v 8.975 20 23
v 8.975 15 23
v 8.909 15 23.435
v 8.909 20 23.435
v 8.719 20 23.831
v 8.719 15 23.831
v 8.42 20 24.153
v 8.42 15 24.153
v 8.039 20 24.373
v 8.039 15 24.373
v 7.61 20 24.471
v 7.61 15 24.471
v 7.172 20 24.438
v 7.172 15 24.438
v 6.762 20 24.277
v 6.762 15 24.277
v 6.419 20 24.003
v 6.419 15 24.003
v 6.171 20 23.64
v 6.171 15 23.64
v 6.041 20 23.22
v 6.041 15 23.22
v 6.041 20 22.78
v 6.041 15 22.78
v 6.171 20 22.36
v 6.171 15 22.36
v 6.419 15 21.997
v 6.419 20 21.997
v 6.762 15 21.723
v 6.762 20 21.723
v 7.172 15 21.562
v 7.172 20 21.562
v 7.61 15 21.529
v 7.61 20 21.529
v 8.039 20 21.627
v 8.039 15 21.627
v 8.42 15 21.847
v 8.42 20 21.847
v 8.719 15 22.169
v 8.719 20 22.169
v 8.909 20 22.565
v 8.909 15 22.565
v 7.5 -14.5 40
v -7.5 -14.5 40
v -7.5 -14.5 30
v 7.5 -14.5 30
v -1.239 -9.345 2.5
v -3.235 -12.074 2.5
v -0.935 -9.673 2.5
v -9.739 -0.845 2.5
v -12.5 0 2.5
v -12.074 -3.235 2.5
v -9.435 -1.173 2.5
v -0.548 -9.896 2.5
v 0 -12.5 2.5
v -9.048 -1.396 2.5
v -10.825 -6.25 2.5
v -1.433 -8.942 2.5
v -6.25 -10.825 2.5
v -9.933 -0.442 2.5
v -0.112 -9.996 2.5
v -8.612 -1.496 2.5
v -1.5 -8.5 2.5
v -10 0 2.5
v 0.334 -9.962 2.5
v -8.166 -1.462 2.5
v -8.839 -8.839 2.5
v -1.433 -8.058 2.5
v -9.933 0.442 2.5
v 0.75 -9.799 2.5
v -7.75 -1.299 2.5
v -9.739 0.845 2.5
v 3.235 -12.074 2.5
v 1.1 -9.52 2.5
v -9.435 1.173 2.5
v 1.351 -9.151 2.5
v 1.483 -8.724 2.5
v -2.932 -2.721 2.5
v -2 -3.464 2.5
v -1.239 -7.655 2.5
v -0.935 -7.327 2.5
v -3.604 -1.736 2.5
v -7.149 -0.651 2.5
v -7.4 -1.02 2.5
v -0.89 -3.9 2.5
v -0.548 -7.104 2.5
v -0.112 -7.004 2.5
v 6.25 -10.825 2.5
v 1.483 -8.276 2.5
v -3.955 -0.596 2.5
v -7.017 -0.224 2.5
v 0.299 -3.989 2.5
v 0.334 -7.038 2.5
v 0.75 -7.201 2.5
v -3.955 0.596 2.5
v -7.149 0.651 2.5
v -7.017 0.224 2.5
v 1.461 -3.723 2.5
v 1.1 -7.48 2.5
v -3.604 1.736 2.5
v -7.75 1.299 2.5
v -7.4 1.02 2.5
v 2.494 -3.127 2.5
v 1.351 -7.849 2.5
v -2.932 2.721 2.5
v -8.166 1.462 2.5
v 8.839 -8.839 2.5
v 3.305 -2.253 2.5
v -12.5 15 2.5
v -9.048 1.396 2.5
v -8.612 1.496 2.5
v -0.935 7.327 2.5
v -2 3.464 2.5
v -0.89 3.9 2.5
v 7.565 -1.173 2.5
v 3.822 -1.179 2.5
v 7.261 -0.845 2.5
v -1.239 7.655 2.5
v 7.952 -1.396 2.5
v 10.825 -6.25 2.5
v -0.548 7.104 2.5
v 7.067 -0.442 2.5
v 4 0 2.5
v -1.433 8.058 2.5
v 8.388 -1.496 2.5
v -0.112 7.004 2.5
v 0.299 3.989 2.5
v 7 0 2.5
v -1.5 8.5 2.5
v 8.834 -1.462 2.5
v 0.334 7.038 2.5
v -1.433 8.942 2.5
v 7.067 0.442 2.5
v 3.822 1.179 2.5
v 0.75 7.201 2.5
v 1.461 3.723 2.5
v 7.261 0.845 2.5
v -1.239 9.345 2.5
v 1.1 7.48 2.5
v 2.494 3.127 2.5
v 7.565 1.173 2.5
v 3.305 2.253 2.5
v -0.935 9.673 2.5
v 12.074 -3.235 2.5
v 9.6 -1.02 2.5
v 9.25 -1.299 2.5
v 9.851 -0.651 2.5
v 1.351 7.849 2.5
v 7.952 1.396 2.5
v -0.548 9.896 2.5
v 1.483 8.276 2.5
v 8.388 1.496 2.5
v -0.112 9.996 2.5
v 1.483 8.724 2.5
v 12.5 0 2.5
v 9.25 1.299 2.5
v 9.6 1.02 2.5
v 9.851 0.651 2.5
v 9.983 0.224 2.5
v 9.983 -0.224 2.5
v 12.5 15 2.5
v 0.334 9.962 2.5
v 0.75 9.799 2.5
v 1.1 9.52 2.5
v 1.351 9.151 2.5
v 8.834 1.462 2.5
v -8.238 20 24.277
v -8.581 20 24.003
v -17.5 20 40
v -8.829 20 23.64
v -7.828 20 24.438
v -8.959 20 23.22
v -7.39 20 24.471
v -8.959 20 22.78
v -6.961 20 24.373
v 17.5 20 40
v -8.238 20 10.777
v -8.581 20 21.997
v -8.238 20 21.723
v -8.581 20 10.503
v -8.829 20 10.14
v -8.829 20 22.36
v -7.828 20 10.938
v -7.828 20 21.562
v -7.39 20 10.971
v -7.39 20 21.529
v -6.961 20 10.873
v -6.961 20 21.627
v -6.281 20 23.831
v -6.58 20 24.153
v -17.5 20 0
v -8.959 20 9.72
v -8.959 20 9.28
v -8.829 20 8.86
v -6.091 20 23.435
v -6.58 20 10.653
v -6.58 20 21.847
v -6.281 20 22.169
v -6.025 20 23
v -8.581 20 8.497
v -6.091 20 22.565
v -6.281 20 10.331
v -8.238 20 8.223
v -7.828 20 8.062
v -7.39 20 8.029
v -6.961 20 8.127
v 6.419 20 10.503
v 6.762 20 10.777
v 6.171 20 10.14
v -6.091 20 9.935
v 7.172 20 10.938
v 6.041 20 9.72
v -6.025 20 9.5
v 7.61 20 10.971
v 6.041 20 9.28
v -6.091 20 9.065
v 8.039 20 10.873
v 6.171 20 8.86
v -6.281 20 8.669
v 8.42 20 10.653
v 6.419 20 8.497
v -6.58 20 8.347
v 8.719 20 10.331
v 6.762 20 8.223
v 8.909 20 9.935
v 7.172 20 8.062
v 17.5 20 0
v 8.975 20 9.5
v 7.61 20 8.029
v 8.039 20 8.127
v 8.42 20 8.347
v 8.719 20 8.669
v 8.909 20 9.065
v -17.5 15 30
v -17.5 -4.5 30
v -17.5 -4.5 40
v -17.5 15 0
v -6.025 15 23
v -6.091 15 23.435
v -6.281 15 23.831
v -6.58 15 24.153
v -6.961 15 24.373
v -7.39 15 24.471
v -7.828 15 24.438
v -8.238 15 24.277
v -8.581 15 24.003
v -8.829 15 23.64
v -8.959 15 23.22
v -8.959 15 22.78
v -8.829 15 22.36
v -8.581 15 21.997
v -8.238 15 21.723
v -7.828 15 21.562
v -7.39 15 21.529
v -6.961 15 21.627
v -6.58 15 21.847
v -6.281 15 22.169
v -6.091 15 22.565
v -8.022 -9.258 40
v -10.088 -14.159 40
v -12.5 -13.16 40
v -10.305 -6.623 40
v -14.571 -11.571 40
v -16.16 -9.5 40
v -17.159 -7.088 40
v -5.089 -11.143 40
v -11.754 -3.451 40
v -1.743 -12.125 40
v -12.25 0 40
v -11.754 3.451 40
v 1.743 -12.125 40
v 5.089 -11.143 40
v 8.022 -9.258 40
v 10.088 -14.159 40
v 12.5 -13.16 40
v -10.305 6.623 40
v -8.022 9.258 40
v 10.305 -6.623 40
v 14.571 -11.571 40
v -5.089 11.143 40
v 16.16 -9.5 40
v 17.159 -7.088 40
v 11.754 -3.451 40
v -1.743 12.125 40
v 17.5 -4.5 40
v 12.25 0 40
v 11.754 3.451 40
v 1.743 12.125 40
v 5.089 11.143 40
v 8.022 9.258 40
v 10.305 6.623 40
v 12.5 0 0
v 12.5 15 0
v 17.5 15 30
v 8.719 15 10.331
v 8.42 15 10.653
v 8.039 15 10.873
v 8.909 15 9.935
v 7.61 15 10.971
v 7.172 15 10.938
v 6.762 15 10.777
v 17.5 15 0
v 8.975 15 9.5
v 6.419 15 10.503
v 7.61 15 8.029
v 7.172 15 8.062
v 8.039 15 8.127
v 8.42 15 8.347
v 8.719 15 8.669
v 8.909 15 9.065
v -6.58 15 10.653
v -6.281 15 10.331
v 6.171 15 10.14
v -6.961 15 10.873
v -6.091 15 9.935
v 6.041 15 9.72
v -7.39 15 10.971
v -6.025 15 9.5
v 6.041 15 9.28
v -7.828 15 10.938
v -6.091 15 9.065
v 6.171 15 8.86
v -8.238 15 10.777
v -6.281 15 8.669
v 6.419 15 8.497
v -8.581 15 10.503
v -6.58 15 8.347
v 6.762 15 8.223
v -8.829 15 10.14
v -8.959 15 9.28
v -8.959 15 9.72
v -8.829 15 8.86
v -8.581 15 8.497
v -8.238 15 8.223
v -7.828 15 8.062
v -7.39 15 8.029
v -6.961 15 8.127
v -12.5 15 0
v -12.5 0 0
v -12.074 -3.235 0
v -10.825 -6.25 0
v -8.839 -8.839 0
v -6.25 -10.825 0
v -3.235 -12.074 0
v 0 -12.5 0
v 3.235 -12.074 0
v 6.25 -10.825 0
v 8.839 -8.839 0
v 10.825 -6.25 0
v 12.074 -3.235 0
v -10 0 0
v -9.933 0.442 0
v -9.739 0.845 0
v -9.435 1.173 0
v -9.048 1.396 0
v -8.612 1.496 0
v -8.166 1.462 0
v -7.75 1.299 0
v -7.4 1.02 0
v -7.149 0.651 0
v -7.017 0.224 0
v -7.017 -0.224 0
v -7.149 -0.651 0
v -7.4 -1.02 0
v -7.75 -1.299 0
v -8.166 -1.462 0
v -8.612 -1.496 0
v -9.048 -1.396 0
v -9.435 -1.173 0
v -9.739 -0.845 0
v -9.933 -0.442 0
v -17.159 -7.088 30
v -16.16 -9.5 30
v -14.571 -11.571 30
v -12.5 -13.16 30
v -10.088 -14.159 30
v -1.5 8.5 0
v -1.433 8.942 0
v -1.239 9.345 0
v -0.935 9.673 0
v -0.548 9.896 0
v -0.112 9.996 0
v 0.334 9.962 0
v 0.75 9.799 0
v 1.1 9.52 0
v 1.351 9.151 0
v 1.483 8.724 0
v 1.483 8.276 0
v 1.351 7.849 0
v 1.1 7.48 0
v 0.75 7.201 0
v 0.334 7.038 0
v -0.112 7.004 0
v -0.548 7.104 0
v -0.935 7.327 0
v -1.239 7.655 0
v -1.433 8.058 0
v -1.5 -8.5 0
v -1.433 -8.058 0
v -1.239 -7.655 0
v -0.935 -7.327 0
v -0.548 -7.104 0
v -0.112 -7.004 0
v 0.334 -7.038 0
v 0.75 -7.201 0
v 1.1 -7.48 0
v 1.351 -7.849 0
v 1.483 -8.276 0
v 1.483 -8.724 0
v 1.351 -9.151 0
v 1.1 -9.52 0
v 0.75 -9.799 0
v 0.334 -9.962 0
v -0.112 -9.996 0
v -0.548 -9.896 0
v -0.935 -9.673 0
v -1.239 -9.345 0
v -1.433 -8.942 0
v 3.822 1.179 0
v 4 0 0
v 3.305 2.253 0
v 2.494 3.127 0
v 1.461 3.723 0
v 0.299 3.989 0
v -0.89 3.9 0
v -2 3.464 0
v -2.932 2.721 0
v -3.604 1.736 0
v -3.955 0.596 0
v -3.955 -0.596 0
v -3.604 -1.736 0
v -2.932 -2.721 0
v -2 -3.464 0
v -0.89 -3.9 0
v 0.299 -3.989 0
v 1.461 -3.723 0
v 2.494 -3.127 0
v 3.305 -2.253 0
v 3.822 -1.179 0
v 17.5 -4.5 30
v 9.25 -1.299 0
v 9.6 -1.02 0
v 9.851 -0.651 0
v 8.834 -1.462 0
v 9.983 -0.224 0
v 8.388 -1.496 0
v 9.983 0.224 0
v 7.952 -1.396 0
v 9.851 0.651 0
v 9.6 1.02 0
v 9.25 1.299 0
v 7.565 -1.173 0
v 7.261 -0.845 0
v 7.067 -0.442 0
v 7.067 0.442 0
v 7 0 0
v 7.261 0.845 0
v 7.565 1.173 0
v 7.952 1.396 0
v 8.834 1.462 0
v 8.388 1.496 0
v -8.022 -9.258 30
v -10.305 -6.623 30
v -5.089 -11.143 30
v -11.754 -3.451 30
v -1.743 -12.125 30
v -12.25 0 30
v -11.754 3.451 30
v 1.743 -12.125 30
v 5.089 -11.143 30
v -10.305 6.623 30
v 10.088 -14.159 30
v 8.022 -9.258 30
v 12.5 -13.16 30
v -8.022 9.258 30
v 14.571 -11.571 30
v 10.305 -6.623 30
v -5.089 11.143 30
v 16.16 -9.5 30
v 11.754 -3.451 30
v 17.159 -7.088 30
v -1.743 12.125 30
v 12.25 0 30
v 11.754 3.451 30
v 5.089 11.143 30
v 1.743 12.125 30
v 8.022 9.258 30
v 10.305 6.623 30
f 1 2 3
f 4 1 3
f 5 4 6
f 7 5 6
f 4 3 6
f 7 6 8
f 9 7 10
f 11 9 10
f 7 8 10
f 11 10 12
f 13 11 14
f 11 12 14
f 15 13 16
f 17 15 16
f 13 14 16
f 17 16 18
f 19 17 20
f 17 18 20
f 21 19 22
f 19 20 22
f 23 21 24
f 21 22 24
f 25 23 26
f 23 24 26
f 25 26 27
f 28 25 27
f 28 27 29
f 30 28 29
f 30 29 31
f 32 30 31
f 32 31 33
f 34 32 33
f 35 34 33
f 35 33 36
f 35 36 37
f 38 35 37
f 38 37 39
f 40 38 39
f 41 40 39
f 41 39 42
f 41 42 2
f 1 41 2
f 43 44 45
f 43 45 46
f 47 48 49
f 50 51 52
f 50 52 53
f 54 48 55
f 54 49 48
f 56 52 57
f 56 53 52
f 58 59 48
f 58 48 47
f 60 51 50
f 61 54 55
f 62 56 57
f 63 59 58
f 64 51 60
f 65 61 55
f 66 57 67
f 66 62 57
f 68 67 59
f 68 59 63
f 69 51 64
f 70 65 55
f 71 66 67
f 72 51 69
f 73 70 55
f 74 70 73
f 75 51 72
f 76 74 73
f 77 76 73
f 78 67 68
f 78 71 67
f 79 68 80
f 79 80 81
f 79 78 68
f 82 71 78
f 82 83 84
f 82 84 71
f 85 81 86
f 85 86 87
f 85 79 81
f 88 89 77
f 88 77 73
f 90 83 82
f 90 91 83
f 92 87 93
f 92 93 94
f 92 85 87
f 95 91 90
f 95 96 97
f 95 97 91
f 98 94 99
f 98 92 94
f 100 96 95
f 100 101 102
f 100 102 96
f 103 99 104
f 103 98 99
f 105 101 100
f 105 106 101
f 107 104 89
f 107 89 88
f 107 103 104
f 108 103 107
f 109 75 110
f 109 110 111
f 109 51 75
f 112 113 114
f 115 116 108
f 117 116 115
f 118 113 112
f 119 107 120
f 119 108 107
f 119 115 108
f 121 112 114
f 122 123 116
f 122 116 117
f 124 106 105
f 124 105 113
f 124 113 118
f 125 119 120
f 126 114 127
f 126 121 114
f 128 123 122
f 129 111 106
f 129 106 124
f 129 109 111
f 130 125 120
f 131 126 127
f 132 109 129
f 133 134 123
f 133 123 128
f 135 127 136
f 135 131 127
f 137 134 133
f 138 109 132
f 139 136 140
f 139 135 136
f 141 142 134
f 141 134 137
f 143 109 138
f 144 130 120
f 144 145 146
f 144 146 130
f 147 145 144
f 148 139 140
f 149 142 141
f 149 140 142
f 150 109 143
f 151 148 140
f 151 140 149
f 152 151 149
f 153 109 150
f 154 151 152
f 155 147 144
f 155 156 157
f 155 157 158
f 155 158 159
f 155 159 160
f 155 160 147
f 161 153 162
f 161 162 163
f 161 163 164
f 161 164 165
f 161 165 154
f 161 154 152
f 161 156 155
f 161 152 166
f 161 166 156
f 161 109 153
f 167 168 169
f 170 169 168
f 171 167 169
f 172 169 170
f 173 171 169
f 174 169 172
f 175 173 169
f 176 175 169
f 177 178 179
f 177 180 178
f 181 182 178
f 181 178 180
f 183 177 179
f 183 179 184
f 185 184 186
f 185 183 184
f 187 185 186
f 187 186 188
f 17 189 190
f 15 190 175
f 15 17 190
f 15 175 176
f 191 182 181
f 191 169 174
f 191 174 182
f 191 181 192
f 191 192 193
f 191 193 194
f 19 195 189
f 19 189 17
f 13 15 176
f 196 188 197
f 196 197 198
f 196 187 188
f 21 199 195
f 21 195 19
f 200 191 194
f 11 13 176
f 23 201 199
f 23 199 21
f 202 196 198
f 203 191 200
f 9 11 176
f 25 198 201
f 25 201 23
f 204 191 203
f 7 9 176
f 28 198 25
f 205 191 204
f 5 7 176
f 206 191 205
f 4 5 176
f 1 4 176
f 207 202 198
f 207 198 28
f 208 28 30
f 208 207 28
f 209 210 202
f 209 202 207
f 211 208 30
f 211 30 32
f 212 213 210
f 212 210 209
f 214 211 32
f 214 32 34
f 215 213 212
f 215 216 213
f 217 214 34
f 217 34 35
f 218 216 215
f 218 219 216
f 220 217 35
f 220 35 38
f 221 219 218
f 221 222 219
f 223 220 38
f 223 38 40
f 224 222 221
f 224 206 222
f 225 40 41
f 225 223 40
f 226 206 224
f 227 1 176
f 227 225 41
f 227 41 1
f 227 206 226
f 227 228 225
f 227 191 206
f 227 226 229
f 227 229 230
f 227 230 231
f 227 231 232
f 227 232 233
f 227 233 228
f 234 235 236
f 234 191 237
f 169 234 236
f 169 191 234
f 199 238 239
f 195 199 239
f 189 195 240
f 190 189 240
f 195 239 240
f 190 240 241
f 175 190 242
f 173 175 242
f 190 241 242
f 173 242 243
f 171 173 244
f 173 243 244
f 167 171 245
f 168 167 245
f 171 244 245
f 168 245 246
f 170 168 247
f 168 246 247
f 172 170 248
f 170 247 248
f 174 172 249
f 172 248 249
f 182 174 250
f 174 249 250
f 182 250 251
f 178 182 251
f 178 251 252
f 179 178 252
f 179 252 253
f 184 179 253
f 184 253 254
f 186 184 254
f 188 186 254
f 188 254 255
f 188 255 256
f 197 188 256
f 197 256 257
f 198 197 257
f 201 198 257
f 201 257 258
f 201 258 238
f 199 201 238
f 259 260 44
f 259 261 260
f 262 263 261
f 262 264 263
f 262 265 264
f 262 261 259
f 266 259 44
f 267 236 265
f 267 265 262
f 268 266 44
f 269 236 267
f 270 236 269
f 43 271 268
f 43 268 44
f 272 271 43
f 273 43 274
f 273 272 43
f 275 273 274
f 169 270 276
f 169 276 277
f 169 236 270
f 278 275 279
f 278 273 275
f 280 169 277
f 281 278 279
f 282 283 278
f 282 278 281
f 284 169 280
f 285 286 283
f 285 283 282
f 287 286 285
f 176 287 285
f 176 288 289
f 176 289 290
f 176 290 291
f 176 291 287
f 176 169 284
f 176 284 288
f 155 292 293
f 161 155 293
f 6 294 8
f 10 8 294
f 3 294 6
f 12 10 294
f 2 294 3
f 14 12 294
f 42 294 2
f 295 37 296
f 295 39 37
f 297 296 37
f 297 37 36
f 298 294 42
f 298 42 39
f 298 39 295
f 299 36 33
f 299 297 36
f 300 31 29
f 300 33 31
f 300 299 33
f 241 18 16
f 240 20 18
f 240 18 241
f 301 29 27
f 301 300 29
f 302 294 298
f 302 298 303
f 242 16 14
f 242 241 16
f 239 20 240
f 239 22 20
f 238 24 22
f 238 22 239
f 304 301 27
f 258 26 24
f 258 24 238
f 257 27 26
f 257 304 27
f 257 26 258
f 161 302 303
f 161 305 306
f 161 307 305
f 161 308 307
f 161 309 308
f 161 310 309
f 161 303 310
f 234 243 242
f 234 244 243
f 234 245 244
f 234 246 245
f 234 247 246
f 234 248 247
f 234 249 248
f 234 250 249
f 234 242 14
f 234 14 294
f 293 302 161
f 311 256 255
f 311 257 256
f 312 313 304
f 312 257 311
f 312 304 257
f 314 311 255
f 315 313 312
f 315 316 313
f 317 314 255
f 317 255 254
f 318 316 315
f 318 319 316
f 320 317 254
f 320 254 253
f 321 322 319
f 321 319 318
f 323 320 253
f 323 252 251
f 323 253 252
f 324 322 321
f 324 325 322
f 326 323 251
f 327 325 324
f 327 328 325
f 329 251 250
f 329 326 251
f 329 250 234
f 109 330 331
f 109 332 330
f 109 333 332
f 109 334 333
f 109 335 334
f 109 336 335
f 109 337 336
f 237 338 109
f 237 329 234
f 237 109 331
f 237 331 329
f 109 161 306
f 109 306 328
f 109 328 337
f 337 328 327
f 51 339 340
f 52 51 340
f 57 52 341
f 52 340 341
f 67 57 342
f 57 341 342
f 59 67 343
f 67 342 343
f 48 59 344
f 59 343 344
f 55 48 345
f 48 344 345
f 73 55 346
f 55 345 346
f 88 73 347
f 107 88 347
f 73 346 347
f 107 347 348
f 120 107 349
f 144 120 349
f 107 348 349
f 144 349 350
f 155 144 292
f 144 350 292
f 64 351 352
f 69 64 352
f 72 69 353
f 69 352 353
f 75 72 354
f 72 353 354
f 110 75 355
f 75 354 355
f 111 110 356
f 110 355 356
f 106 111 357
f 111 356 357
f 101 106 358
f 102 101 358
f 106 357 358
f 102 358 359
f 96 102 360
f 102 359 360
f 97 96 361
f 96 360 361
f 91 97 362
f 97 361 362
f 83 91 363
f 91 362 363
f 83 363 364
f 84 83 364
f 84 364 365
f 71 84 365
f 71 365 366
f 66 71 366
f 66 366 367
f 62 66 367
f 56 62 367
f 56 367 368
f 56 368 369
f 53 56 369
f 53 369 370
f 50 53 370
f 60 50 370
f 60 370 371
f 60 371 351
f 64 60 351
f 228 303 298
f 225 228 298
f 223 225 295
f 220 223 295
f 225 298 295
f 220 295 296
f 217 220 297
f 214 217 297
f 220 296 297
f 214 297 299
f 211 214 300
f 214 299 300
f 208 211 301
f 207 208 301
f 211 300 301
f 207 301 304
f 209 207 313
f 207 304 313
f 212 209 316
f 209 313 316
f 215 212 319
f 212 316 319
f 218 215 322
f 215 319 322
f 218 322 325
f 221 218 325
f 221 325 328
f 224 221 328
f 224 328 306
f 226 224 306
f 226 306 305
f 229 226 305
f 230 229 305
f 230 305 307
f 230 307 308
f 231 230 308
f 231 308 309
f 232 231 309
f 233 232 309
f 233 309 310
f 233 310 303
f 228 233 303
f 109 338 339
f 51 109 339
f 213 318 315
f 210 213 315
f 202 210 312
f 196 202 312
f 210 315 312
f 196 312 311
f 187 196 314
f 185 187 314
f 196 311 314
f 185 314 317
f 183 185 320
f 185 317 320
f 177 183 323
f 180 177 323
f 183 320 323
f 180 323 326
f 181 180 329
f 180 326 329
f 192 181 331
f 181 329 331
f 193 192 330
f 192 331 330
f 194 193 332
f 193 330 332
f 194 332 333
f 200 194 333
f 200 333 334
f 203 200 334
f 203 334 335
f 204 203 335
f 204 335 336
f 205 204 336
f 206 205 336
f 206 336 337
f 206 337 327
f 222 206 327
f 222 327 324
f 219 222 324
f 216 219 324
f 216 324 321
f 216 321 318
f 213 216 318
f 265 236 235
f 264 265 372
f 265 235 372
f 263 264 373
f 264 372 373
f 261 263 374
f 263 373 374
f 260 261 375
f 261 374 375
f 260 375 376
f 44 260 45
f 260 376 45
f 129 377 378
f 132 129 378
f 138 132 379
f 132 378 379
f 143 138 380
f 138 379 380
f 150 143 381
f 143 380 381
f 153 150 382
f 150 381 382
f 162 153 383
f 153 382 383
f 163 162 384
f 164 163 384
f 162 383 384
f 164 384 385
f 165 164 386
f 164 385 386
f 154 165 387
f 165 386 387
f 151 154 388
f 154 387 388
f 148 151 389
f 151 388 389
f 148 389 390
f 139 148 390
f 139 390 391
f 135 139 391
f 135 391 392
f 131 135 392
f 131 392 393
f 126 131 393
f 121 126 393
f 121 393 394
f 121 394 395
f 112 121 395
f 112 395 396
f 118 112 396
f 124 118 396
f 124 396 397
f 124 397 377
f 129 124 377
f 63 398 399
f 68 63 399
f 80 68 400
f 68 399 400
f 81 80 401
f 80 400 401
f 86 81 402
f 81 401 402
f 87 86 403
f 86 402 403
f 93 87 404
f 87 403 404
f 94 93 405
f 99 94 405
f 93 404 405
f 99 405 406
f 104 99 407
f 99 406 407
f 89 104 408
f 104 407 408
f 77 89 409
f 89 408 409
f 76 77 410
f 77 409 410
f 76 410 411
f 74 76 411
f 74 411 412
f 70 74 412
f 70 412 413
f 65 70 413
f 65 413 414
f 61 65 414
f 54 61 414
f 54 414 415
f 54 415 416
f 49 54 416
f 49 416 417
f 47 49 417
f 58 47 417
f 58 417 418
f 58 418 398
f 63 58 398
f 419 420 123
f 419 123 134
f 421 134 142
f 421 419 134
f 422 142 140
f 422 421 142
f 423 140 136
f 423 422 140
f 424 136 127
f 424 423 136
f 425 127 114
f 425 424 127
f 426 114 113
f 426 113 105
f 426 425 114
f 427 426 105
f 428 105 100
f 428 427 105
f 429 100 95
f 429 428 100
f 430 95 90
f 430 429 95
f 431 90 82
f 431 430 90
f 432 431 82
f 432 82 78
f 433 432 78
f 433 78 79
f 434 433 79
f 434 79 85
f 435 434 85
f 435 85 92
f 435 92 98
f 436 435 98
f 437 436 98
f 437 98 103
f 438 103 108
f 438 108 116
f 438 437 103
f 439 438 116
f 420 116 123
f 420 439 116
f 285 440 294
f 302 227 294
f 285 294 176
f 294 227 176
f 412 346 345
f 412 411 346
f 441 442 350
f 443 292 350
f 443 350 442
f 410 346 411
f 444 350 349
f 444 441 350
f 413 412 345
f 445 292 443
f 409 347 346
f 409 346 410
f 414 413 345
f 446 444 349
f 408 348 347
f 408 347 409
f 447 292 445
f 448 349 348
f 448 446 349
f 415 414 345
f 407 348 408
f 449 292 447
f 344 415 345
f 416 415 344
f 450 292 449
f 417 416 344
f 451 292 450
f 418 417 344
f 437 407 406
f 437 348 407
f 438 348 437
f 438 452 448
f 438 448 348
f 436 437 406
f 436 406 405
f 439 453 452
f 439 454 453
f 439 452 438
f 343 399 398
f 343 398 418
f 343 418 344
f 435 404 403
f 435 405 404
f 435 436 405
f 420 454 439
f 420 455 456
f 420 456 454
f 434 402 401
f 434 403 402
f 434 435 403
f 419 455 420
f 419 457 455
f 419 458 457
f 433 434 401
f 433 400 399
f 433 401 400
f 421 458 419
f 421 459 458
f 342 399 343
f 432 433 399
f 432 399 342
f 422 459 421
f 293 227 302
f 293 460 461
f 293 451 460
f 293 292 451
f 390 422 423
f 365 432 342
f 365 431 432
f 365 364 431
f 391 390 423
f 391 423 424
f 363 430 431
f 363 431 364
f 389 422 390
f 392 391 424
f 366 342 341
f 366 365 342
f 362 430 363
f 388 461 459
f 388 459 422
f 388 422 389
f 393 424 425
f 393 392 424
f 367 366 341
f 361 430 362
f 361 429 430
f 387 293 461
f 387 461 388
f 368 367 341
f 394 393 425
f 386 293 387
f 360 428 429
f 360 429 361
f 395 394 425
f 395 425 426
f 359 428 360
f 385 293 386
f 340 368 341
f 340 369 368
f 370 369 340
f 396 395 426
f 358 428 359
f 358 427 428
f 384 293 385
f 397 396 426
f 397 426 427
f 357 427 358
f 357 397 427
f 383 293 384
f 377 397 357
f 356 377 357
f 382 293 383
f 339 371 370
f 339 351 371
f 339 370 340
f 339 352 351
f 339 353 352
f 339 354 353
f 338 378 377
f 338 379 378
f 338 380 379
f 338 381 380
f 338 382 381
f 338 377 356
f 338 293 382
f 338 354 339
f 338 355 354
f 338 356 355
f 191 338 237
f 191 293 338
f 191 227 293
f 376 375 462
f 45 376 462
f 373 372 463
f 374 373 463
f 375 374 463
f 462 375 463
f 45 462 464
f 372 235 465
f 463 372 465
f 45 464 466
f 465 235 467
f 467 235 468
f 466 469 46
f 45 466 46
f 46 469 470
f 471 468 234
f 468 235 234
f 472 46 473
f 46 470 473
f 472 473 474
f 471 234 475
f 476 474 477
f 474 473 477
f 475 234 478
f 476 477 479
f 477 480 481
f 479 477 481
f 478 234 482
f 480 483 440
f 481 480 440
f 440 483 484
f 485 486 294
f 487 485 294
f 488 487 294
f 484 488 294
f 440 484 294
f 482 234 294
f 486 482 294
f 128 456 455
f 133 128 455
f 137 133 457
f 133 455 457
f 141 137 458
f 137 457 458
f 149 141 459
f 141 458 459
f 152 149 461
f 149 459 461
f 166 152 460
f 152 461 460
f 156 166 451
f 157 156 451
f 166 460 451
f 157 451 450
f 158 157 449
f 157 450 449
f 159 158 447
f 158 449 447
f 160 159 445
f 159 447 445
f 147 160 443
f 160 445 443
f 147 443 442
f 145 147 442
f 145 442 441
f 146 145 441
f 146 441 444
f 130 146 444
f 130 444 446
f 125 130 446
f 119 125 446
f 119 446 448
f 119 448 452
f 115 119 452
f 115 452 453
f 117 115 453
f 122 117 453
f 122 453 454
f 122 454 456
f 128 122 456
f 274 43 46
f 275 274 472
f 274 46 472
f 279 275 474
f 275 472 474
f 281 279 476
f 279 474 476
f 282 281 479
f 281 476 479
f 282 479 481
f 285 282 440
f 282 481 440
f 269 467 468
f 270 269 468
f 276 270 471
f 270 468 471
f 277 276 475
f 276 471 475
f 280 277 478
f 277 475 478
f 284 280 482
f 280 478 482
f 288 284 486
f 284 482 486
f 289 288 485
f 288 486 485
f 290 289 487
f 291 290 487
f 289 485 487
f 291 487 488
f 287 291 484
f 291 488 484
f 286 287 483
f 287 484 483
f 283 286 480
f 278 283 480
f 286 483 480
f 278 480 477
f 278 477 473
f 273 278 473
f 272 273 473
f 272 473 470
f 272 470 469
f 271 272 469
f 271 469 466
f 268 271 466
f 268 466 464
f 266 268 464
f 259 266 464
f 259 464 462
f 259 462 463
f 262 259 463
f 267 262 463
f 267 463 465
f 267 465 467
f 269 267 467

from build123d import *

# Parameters (mm, degrees)
SKETCH1_R           = 12.5
SKETCH1_R_2         = 4
BOSS_EXTRUDE1_DEPTH = 2.5
SKETCH2_W           = 25
SKETCH2_H           = 5
SKETCH2_W_2         = 5
BOSS_EXTRUDE3_DEPTH = 40
SKETCH3_W           = 35
SKETCH3_H           = 10
BOSS_EXTRUDE5_DEPTH = 29.5
SKETCH5_R           = 12.25
CUT_EXTRUDE1_DEPTH  = 29.5
SKETCH6_R           = 1.5
CUT_EXTRUDE2_DEPTH  = 29.5
SKETCH7_R           = 1.475
CUT_EXTRUDE4_DEPTH  = 10
SKETCH8_R           = 1.5
CUT_EXTRUDE5_DEPTH  = 10


with BuildPart() as part:
    # Sketch1 → Boss-Extrude1 (new body)
    with BuildSketch(Plane.XY):
        with BuildLine():
            Line((12.5, 20), (-12.5, 20))
            Line((-12.5, 20), (-12.5, 1.2e-08))
            ThreePointArc((-12.5, 1.2e-08), (6e-09, 12.5), (12.5, 0))
            Line((12.5, 0), (12.5, 20))
        make_face()
        Circle(SKETCH1_R)
        Circle(SKETCH1_R_2, mode=Mode.SUBTRACT)
    extrude(amount=BOSS_EXTRUDE1_DEPTH)

    # Sketch2 → Boss-Extrude3 (add)
    with BuildSketch(Plane(origin=(0, 0, 0), x_dir=(-1, 0, 0), z_dir=(0, 0, -1))):
        with Locations((0, 17.5)):
            Rectangle(SKETCH2_W, SKETCH2_H)
        with Locations((-15, 17.5)):
            Rectangle(SKETCH2_W_2, SKETCH2_H)
        with Locations((15, 17.5)):
            Rectangle(SKETCH2_W_2, SKETCH2_H)
    extrude(amount=-BOSS_EXTRUDE3_DEPTH)

    # Sketch3 → Boss-Extrude5 (add)
    with BuildSketch(Plane.XZ.offset(-15)):
        with Locations((0, 35)):
            Rectangle(SKETCH3_W, SKETCH3_H)
    extrude(amount=BOSS_EXTRUDE5_DEPTH)

    # Sketch5 → Cut-Extrude1 (cut)
    with BuildSketch(Plane(origin=(0, 0, 30), x_dir=(-1, 0, 0), z_dir=(0, 0, -1))):
        Circle(SKETCH5_R)
        with BuildLine():
            Line((17.5, -14.5), (17.5, -4.5))
            ThreePointArc((17.5, -4.5), (14.571067812, -11.571067812), (7.5, -14.5))
            Line((7.5, -14.5), (17.5, -14.5))
        make_face()
        with BuildLine():
            ThreePointArc((-7.5, -14.5), (-14.571067812, -11.571067812), (-17.5, -4.5))
            Line((-17.5, -4.5), (-17.5, -14.5))
            Line((-17.5, -14.5), (-7.5, -14.5))
        make_face()
    extrude(amount=-CUT_EXTRUDE1_DEPTH, mode=Mode.SUBTRACT)

    # Sketch6 → Cut-Extrude2 (cut)
    with BuildSketch(Plane(origin=(0, 0, 0), x_dir=(-1, 0, 0), z_dir=(0, 0, -1))):
        with Locations((0, 8.5)):
            Circle(SKETCH6_R)
        with Locations((0, -8.5)):
            Circle(SKETCH6_R)
    extrude(amount=-CUT_EXTRUDE2_DEPTH, mode=Mode.SUBTRACT)

    # Sketch7 → Cut-Extrude4 (cut)
    with BuildSketch(Plane.XZ.offset(-15)):
        with Locations((7.5, 23)):
            Circle(SKETCH7_R)
        with Locations((-7.5, 23)):
            Circle(SKETCH7_R)
        with Locations((7.5, 9.5)):
            Circle(SKETCH7_R)
        with Locations((-7.5, 9.5)):
            Circle(SKETCH7_R)
    extrude(amount=-CUT_EXTRUDE4_DEPTH, mode=Mode.SUBTRACT)

    # Sketch8 → Cut-Extrude5 (cut)
    with BuildSketch(Plane(origin=(0, 0, 0), x_dir=(-1, 0, 0), z_dir=(0, 0, -1))):
        with Locations((-8.5, 0)):
            Circle(SKETCH8_R)
        with Locations((8.5, 0)):
            Circle(SKETCH8_R)
    extrude(amount=-CUT_EXTRUDE5_DEPTH, mode=Mode.SUBTRACT)


solid = part.part
